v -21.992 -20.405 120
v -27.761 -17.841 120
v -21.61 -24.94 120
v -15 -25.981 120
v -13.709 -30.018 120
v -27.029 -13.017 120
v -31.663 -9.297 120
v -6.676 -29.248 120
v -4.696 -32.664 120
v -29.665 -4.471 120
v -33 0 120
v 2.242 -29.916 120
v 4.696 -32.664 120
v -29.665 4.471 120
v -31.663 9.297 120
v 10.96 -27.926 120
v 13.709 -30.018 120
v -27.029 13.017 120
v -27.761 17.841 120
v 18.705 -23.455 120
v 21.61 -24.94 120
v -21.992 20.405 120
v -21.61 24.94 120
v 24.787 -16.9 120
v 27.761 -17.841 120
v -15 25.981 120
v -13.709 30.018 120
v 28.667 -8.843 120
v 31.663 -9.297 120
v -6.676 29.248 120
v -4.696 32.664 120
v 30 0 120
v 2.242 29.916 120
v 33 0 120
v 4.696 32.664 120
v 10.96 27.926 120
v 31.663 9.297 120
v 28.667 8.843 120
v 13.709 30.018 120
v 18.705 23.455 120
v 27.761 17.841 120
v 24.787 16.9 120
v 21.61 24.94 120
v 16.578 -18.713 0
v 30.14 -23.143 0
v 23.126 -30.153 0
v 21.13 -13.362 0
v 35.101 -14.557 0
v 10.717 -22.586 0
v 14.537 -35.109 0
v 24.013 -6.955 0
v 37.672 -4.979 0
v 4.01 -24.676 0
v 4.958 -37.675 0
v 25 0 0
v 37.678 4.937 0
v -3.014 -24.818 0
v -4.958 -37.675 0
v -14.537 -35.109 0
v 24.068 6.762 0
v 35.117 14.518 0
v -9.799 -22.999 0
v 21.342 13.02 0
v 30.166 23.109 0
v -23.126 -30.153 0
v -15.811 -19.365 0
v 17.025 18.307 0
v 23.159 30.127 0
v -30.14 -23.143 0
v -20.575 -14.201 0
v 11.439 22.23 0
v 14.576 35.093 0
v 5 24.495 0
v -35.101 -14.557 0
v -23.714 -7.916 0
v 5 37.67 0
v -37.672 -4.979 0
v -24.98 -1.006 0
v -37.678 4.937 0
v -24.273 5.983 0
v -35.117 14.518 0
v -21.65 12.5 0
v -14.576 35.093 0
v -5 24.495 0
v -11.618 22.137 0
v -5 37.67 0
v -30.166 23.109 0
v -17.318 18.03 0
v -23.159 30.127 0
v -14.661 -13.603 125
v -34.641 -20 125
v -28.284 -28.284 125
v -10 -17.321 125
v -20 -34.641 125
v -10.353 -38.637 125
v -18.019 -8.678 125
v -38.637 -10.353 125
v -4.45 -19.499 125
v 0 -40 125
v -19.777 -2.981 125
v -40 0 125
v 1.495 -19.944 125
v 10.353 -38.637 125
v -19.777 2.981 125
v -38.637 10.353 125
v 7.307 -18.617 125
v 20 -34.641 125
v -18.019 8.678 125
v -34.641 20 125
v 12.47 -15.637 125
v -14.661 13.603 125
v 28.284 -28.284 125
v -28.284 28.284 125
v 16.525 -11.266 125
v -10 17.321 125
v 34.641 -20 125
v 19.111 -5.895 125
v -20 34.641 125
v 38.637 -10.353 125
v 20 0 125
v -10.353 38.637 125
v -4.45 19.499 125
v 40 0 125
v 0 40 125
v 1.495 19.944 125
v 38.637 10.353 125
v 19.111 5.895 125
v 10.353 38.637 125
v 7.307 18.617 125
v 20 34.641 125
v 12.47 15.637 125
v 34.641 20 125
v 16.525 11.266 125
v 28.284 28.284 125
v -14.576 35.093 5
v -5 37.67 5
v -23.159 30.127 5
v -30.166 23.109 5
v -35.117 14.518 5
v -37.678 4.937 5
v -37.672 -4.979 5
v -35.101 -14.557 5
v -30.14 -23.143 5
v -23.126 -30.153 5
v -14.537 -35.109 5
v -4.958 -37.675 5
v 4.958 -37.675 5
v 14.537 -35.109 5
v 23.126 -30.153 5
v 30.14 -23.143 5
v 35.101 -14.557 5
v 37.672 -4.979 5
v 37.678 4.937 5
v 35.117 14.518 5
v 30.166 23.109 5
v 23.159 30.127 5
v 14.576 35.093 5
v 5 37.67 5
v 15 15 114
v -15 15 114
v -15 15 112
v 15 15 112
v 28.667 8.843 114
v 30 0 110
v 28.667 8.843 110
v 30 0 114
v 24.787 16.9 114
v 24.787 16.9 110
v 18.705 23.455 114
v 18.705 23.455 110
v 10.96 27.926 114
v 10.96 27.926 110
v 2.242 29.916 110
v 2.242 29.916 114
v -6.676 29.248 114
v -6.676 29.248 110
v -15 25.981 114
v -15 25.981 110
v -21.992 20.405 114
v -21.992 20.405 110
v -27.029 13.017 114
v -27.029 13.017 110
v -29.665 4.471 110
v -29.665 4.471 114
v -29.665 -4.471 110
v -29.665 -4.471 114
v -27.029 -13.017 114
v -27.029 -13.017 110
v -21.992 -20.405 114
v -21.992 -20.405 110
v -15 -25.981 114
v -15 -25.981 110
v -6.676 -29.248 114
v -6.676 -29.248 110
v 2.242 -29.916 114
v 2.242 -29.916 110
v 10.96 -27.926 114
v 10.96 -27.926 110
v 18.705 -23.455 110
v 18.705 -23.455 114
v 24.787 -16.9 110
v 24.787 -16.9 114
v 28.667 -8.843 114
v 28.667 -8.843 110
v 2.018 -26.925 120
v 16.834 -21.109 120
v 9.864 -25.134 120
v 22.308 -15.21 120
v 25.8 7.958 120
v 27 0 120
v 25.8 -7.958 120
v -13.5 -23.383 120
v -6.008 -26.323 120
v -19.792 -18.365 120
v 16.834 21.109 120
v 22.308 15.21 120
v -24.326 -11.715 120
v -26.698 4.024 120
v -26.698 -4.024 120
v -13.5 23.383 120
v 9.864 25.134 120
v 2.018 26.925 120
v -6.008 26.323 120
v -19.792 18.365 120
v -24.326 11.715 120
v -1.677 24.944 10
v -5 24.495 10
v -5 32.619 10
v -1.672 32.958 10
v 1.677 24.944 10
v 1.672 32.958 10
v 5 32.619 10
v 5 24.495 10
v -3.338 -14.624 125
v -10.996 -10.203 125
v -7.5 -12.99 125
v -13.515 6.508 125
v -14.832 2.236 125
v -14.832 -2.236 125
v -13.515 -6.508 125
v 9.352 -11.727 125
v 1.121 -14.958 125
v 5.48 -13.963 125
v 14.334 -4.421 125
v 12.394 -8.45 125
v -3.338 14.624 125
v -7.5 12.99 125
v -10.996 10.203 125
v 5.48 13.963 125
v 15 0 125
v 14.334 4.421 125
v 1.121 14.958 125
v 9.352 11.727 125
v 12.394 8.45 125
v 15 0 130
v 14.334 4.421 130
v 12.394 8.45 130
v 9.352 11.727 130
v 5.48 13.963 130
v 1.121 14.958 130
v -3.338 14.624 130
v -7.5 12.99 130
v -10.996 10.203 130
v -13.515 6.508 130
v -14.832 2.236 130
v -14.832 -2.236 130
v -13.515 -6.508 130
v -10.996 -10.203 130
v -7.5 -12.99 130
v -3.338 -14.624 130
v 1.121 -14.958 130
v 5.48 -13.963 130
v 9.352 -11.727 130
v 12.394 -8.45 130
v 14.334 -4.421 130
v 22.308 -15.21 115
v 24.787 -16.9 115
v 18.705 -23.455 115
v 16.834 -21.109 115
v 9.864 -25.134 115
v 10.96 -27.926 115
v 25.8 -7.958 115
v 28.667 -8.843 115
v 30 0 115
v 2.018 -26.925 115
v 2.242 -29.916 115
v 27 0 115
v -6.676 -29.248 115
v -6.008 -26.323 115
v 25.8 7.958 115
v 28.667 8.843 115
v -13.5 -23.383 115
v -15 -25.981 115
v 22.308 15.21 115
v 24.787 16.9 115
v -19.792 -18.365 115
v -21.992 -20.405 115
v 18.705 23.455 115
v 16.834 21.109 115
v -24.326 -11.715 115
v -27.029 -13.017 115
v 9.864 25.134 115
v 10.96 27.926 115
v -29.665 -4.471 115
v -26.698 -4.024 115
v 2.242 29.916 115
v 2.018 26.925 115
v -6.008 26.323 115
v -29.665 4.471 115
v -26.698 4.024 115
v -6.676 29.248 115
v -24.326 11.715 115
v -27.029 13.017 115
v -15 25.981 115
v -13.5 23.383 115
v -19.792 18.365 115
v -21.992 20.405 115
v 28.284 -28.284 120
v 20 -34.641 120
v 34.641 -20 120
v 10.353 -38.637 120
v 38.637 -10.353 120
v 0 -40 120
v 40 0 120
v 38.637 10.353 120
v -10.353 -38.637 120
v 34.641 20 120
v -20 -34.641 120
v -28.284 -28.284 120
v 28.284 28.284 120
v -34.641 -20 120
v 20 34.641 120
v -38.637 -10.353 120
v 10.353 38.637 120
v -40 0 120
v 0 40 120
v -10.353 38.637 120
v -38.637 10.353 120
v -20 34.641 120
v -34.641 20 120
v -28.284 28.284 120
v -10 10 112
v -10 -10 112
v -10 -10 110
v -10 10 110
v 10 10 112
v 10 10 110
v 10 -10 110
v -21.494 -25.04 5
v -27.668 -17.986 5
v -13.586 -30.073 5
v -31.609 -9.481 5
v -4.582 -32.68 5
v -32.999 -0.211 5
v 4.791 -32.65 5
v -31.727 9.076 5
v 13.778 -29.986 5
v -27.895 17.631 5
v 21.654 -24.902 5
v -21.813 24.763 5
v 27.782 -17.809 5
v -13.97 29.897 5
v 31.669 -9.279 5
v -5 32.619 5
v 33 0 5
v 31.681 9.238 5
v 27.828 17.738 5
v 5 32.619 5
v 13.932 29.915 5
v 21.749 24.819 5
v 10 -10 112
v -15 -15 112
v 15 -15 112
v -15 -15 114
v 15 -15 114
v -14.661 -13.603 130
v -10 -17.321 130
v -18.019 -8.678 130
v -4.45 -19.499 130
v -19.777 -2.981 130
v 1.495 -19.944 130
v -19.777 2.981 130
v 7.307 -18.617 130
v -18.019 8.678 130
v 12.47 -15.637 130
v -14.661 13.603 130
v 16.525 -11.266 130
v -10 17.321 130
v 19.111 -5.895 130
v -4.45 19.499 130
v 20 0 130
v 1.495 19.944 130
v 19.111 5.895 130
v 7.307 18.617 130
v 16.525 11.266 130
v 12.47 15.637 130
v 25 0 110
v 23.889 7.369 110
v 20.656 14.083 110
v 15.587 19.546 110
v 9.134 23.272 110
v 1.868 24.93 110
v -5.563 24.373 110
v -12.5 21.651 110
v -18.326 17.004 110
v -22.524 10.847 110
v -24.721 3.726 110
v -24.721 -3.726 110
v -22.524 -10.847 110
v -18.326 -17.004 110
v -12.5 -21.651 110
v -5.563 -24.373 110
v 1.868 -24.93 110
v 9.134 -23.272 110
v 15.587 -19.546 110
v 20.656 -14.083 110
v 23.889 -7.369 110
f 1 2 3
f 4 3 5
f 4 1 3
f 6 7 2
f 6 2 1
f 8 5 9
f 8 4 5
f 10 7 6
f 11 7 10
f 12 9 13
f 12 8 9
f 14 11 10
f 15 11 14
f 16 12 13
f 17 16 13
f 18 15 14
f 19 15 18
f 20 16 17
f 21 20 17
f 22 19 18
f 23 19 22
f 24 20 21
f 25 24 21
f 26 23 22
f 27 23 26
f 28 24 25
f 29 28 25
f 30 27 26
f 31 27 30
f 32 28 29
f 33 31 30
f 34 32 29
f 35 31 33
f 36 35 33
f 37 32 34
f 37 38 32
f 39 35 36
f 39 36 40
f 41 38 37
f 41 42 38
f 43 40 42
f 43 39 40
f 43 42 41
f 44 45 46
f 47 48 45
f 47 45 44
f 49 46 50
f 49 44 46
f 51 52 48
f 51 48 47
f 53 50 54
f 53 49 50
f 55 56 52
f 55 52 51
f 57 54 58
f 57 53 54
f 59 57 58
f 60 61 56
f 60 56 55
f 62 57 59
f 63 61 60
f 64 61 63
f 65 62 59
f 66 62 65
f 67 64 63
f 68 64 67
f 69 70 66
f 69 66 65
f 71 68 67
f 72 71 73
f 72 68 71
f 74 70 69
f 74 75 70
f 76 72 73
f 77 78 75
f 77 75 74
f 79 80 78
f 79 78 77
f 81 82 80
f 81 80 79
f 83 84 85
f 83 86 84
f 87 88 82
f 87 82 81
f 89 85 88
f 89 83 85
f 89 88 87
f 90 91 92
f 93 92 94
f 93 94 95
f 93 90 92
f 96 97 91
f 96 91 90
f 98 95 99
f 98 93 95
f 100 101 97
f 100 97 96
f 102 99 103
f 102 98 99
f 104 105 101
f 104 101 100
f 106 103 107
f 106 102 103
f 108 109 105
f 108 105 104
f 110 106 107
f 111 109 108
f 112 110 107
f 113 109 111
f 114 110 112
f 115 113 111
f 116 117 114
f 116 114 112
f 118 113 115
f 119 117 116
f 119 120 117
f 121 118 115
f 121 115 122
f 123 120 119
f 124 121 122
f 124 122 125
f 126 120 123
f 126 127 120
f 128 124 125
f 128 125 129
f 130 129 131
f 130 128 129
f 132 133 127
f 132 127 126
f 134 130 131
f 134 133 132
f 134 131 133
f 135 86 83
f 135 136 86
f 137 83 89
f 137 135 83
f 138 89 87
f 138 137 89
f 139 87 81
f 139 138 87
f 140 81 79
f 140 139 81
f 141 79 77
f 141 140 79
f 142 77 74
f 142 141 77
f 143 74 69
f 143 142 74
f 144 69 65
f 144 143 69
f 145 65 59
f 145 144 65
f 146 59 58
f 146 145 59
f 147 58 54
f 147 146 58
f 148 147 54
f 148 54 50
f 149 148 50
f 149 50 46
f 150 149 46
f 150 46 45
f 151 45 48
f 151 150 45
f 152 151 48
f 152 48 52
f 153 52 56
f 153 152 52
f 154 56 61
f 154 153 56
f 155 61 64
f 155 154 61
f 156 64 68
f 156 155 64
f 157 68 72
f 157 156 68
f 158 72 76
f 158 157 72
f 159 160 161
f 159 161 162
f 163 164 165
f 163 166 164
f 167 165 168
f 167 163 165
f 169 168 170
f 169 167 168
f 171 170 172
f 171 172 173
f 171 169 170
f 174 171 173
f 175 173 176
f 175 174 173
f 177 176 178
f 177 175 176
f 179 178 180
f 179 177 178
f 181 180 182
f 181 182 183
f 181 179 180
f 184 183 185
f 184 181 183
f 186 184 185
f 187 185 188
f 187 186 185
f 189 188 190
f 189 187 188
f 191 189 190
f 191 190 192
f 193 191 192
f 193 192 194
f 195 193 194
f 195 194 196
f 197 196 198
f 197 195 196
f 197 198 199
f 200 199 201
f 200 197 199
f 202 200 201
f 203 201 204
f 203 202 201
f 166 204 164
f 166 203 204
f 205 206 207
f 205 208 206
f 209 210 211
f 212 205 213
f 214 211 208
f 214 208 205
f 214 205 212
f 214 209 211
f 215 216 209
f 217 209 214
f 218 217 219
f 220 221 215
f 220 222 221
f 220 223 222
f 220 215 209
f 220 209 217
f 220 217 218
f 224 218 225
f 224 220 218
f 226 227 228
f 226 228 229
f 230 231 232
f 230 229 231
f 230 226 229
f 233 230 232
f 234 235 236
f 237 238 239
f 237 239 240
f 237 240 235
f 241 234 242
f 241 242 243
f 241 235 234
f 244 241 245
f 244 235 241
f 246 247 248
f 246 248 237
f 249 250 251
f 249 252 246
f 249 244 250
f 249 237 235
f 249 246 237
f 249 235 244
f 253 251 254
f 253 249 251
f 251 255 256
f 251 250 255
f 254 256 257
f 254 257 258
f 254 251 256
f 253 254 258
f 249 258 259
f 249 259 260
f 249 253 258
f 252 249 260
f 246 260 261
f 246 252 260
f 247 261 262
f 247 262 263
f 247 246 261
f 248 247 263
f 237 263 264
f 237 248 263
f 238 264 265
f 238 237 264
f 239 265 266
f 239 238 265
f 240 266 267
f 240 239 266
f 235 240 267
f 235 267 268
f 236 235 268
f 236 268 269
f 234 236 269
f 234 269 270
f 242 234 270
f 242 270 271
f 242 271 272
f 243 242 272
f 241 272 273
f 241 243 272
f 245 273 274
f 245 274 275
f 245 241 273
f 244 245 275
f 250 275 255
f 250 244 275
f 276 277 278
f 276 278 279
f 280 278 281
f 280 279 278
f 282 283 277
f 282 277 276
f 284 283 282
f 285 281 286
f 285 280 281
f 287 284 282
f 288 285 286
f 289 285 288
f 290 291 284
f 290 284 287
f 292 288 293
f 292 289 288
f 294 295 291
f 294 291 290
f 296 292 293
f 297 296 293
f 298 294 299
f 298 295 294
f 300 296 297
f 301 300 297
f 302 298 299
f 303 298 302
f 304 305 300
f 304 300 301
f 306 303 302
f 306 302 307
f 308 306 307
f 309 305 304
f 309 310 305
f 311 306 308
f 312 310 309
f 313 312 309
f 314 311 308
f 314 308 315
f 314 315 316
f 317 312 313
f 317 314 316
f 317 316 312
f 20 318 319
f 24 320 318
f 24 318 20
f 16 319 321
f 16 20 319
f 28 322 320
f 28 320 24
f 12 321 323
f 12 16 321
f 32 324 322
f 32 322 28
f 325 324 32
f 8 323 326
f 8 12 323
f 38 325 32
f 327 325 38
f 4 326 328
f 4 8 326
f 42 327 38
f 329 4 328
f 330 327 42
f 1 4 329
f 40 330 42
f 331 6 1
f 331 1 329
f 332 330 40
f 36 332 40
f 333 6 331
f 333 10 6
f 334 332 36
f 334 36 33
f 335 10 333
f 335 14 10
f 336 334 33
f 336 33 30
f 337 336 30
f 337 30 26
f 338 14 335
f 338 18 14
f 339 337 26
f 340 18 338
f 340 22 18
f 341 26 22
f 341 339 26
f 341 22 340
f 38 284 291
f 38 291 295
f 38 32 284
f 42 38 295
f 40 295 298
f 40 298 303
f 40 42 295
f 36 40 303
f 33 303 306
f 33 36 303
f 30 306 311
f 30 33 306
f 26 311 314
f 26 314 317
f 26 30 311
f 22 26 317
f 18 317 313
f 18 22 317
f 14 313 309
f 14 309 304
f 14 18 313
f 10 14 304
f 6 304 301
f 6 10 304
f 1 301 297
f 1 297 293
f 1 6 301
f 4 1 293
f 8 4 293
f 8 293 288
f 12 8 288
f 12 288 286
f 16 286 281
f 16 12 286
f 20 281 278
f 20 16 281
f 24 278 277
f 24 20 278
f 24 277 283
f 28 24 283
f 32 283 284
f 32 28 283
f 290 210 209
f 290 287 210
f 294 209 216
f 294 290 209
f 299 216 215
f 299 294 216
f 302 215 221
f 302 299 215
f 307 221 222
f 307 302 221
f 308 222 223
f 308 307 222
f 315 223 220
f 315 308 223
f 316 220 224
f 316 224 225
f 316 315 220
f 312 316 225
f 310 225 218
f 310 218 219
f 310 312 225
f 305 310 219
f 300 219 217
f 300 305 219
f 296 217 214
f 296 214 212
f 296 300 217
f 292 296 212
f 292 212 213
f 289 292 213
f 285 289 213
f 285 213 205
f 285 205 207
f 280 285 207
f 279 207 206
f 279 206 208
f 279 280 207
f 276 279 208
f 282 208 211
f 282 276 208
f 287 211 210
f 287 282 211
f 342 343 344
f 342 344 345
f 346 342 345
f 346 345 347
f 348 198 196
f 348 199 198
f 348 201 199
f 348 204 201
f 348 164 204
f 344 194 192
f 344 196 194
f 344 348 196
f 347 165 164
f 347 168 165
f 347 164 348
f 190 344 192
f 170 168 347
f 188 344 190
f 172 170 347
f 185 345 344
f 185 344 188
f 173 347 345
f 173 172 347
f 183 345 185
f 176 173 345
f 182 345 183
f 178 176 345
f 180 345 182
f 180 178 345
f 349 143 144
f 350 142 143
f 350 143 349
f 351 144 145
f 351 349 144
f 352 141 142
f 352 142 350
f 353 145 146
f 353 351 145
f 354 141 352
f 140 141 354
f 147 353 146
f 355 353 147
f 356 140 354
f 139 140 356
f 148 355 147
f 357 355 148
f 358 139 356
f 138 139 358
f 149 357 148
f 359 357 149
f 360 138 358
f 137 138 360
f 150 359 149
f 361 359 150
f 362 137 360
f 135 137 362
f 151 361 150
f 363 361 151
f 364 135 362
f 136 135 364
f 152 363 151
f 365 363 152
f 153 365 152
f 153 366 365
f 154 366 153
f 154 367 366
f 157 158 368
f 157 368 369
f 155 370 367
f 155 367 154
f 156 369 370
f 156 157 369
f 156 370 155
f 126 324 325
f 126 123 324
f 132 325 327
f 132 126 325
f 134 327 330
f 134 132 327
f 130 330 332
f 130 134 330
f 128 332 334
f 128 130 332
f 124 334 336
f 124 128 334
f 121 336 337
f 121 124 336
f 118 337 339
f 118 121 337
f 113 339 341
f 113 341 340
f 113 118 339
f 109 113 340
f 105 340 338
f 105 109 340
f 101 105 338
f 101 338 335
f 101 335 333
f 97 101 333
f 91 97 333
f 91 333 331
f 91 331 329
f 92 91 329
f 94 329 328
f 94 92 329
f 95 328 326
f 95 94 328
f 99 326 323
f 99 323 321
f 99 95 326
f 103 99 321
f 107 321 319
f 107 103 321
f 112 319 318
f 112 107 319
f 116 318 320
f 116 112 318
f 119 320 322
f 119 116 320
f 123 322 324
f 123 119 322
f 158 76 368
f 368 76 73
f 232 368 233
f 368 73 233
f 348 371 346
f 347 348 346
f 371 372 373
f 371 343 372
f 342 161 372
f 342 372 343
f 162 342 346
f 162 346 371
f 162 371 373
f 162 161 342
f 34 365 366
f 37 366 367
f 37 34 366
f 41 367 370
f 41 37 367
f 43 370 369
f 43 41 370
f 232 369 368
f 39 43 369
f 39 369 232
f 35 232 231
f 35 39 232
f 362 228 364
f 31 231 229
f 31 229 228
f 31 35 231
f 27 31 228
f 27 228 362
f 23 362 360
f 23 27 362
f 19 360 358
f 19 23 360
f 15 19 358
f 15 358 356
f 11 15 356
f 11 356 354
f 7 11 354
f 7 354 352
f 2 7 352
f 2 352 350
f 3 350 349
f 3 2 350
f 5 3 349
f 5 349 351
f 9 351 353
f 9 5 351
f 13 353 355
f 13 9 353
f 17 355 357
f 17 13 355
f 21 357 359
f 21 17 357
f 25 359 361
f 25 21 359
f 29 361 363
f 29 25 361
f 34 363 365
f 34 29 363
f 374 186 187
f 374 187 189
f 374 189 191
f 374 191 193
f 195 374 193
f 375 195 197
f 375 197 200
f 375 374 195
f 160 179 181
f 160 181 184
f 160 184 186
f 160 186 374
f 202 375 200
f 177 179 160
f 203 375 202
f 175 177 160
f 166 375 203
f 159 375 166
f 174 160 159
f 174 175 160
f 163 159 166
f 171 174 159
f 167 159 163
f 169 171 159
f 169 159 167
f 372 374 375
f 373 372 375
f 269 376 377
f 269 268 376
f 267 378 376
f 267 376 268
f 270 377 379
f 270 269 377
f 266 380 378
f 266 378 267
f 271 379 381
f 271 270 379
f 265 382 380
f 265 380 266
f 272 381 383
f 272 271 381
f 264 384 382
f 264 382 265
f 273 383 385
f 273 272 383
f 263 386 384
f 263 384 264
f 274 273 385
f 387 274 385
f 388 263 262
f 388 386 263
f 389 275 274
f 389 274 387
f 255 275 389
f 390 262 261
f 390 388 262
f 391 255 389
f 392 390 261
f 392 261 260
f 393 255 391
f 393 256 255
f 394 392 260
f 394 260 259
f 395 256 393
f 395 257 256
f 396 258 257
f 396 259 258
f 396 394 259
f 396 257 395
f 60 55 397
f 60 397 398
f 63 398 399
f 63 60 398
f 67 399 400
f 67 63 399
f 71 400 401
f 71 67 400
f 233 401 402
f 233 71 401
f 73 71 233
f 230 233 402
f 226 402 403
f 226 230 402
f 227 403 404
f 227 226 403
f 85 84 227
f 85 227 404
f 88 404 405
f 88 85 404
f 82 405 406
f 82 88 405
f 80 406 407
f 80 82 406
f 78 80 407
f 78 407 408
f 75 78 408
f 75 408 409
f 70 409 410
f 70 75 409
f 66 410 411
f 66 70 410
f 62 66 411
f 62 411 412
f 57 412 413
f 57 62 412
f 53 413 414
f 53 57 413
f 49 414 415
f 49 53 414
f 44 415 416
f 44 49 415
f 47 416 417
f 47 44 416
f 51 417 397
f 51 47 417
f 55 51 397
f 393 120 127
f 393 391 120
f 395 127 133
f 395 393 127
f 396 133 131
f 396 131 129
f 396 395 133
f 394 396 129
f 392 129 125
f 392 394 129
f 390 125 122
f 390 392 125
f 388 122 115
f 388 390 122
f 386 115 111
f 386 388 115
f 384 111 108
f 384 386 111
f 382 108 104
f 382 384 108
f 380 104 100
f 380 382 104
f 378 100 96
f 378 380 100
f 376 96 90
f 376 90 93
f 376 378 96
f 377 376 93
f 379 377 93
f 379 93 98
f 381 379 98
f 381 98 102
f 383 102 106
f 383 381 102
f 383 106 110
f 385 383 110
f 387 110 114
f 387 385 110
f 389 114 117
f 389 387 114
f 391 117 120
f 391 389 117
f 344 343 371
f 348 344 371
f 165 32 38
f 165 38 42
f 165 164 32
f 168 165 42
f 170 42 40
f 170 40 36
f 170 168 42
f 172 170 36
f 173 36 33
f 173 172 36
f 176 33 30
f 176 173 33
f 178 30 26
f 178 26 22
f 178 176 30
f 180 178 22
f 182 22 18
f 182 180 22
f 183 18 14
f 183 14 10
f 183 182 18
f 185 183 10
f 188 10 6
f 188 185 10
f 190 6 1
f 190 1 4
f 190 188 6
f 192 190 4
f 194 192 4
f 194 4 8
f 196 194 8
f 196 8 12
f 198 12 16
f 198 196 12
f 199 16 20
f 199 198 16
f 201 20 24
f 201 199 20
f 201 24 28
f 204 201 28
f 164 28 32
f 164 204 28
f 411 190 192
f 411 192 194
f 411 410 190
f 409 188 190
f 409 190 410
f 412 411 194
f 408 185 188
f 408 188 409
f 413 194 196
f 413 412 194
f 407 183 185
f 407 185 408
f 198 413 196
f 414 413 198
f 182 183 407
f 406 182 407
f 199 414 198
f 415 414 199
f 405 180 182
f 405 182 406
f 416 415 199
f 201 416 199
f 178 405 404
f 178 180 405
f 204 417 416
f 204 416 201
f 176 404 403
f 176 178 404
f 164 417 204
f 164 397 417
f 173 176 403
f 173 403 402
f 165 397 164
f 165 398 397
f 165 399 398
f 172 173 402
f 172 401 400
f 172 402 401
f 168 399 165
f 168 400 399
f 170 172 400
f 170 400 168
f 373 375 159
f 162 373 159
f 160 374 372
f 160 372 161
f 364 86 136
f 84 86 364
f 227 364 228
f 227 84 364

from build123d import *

# Parameters (mm, degrees)
F4_W     = 10
F4_H     = 10
F5_DEPTH = 77.6
F6_W     = 30
F6_H     = 30
F7_DEPTH = 2
F8_W     = 20
F8_H     = 20
F9_DEPTH = 2


with BuildPart() as f1:
    # F0 (on Front) → F1 (revolve)
    with BuildSketch(Plane.XZ):
        Polygon((33, 5), (33, 120), (30, 120), (30, 115), (30, 114), (30, 110), (25, 110), (25, 0), (38, 0), (38, 5), align=None)
    revolve(axis=Axis((0, 0, 57), (0, 0, 1)))

    # F4 (on Front) → F5 (cut)
    with BuildSketch(Plane.XZ):
        with Locations((0, 5)):
            Rectangle(F4_W, F4_H)
    extrude(amount=-F5_DEPTH, mode=Mode.SUBTRACT)


with BuildPart() as f2:
    # F0 (on Front) → F2 (revolve)
    with BuildSketch(Plane.XZ):
        Polygon((33, 120), (40, 120), (40, 125), (20, 125), (20, 130), (15, 130), (15, 125), (0, 125), (0, 120), (27, 120), (27, 115), (30, 115), (30, 120), align=None)
    revolve(axis=Axis((0, 0, 57), (0, 0, 1)))


with BuildPart() as f3:
    # F0 (on Front) → F3 (revolve)
    with BuildSketch(Plane.XZ):
        Polygon((30, 110), (30, 114), (0, 114), (0, 110), (25, 110), align=None)
    revolve(axis=Axis((0, 0, 57), (0, 0, 1)))

    # F6 (on face) → F7 (cut)
    with BuildSketch(Plane.XY.offset(114)):
        Rectangle(F6_W, F6_H)
    extrude(amount=-F7_DEPTH, mode=Mode.SUBTRACT)

    # F8 (on face) → F9 (cut)
    with BuildSketch(Plane.XY.offset(112)):
        Rectangle(F8_W, F8_H)
    extrude(amount=-F9_DEPTH, mode=Mode.SUBTRACT)


solid = Compound([f1.part, f2.part, f3.part])
